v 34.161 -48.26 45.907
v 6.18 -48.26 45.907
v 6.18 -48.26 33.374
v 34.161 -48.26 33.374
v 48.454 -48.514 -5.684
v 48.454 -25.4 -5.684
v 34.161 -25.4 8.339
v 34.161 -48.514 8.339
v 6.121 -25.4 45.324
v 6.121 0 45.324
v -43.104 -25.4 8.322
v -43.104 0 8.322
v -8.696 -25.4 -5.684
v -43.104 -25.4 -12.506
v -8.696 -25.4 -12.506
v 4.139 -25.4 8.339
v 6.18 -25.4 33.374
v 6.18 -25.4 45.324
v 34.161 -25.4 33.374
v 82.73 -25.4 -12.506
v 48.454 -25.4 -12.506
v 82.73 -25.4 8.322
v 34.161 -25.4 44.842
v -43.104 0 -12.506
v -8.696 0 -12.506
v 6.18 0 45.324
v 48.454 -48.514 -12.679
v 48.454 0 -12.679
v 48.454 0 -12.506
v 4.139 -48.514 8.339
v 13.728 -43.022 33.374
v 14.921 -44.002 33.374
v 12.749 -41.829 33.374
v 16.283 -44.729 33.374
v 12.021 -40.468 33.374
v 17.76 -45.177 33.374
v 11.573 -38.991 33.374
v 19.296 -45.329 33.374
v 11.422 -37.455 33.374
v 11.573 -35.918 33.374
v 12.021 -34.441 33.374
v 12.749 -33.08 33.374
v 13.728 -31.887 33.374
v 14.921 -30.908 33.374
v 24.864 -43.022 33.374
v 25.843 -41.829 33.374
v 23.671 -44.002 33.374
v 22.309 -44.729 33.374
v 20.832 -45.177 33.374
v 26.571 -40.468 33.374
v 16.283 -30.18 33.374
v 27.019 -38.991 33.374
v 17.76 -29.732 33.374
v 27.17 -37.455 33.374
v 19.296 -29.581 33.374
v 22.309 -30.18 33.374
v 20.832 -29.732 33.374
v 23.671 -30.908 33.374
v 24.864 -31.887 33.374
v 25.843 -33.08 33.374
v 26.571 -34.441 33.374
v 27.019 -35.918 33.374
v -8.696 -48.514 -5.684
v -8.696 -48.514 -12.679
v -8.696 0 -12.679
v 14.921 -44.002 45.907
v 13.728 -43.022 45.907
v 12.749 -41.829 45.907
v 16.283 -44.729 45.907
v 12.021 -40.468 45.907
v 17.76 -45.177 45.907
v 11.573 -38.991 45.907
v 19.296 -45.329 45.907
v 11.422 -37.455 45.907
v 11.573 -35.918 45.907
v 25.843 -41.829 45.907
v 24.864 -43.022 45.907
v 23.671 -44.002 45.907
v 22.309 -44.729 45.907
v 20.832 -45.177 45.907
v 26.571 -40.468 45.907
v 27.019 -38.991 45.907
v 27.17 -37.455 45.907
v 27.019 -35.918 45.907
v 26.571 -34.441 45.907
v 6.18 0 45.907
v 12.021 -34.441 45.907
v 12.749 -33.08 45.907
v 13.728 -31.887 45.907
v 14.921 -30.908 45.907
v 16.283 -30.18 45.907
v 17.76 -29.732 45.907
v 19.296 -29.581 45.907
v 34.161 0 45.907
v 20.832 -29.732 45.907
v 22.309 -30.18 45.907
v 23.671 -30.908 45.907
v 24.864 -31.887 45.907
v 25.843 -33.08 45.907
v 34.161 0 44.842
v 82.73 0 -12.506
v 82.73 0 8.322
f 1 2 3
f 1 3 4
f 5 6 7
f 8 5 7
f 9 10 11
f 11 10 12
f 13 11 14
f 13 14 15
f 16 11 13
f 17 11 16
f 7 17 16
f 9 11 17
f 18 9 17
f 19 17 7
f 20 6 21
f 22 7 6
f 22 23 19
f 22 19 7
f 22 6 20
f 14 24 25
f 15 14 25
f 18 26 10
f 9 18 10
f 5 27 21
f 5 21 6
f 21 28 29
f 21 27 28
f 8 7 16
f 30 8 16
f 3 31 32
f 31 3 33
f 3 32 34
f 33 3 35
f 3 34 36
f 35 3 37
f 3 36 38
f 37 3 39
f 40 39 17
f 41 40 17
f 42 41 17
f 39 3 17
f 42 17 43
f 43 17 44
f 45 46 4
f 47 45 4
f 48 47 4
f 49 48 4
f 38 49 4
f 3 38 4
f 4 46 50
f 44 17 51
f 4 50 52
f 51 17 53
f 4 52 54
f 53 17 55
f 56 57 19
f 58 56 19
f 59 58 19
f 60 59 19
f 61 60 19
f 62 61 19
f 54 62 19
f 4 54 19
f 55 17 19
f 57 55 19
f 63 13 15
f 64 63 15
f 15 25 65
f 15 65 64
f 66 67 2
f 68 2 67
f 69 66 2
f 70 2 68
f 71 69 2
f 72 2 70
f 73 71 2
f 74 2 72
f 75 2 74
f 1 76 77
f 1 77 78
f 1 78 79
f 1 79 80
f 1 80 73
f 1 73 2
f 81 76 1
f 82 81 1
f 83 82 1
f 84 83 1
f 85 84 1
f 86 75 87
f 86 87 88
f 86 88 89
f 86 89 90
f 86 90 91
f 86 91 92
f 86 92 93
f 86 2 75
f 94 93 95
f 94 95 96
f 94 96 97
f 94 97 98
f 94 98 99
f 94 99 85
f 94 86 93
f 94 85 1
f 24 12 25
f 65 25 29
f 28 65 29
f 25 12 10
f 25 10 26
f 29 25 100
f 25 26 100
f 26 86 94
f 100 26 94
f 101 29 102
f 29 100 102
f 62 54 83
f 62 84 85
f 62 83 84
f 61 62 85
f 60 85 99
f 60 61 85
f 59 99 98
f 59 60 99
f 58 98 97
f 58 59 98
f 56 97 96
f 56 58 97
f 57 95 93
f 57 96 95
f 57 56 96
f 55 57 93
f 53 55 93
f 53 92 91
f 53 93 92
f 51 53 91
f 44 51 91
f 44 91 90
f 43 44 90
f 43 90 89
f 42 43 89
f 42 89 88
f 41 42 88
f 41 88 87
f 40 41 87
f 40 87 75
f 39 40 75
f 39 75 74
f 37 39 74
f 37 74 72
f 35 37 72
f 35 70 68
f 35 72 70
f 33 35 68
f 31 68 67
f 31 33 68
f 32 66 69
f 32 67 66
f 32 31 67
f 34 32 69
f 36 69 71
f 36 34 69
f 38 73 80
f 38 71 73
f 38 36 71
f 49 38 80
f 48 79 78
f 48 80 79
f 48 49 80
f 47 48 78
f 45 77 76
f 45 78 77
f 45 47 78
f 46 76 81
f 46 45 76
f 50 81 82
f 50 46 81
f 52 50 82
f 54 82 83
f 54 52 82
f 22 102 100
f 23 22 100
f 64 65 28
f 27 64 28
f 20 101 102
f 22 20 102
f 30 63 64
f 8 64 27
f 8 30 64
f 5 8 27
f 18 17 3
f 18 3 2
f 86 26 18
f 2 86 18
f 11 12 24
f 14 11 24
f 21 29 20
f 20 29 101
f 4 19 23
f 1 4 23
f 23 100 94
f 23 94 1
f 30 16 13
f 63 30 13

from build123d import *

# Parameters (mm, degrees)
F1_DEPTH = 25.4
F2_W     = 27.981639
F2_H     = 12.533441
F3_DEPTH = 48.26
F4_R     = 7.874
F5_DEPTH = 52.324
F7_DEPTH = 48.514


with BuildPart() as f1:
    # F0 (on Front) → F1 (new body)
    with BuildSketch(Plane.XZ):
        Polygon((6.120985, 45.324426), (-43.104272, 8.321789), (-43.104272, -12.506211), (82.729638, -12.506211), (82.729638, 8.321789), (33.519674, 45.324426), align=None)
    extrude(amount=F1_DEPTH)

    # F2 (on Front) → F3 (join)
    with BuildSketch(Plane.XZ):
        with Locations((20.170395, 39.640653)):
            Rectangle(F2_W, F2_H)
    extrude(amount=F3_DEPTH)

    # F4 (on Top) → F5 (cut)
    with BuildSketch(Plane.XY):
        with Locations((19.295966, -37.45459)):
            Circle(F4_R)
    extrude(amount=F5_DEPTH, mode=Mode.SUBTRACT)

    # F6 (on Front) → F7 (join)
    with BuildSketch(Plane.XZ):
        Polygon((-8.696082, -5.683771), (-8.696082, -12.67918), (48.453918, -12.67918), (48.453918, -5.683771), (34.161214, 8.338805), (4.138858, 8.338805), align=None)
    extrude(amount=F7_DEPTH)


solid = f1.part
